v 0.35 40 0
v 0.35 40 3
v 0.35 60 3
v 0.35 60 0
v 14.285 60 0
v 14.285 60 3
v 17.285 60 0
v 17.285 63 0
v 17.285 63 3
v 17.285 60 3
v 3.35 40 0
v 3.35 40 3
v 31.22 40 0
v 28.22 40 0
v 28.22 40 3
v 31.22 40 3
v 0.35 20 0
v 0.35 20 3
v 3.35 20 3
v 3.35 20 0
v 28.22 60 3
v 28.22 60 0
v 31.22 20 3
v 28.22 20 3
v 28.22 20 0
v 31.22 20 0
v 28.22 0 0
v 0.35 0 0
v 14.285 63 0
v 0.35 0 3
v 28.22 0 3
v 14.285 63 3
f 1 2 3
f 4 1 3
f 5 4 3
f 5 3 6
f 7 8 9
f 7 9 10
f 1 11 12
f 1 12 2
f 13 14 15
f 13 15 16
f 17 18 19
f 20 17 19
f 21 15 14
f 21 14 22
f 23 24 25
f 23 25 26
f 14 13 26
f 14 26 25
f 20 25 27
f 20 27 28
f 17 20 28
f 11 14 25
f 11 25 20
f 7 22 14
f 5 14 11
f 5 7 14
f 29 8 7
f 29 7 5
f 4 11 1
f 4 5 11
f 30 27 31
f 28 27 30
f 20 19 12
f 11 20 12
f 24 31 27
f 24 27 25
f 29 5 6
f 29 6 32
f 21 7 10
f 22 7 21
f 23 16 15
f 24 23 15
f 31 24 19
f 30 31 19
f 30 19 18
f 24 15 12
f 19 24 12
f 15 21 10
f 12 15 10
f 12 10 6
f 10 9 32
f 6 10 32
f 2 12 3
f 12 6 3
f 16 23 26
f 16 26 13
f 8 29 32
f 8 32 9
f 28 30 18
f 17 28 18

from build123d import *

# Parameters (mm, degrees)
PLATE_THICKNESS_3MM_DEPTH = 3
SKETCH_1_W                = 0.35
SKETCH_1_H                = 60
SKETCH_1_H_2              = 20
CUT_EXTRUDE_1_DEPTH       = 3


with BuildPart() as part:
    # Sketch1 → Plate_thickness_3mm (new body)
    with BuildSketch(Plane.XY):
        Polygon((28.57, 0), (0, 0), (0, 20), (3, 20), (3, 40), (0, 40), (0, 60), (14.285, 60), (14.285, 63), (17.285, 63), (17.285, 60), (28.57, 60), (28.57, 40), (31.57, 40), (31.57, 20), (28.57, 20), align=None)
    extrude(amount=PLATE_THICKNESS_3MM_DEPTH)

    # 草图1 → 切除-拉伸1 (cut)
    with BuildSketch(Plane.XY.offset(3)):
        with Locations((0.175, 30)):
            Rectangle(SKETCH_1_W, SKETCH_1_H)
        with Locations((3.175, 30)):
            Rectangle(SKETCH_1_W, SKETCH_1_H_2)
        with Locations((28.395, 50)):
            Rectangle(SKETCH_1_W, SKETCH_1_H_2)
        with Locations((31.395, 30)):
            Rectangle(SKETCH_1_W, SKETCH_1_H_2)
        with Locations((28.395, 10)):
            Rectangle(SKETCH_1_W, SKETCH_1_H_2)
    extrude(amount=-CUT_EXTRUDE_1_DEPTH, mode=Mode.SUBTRACT)


solid = part.part
